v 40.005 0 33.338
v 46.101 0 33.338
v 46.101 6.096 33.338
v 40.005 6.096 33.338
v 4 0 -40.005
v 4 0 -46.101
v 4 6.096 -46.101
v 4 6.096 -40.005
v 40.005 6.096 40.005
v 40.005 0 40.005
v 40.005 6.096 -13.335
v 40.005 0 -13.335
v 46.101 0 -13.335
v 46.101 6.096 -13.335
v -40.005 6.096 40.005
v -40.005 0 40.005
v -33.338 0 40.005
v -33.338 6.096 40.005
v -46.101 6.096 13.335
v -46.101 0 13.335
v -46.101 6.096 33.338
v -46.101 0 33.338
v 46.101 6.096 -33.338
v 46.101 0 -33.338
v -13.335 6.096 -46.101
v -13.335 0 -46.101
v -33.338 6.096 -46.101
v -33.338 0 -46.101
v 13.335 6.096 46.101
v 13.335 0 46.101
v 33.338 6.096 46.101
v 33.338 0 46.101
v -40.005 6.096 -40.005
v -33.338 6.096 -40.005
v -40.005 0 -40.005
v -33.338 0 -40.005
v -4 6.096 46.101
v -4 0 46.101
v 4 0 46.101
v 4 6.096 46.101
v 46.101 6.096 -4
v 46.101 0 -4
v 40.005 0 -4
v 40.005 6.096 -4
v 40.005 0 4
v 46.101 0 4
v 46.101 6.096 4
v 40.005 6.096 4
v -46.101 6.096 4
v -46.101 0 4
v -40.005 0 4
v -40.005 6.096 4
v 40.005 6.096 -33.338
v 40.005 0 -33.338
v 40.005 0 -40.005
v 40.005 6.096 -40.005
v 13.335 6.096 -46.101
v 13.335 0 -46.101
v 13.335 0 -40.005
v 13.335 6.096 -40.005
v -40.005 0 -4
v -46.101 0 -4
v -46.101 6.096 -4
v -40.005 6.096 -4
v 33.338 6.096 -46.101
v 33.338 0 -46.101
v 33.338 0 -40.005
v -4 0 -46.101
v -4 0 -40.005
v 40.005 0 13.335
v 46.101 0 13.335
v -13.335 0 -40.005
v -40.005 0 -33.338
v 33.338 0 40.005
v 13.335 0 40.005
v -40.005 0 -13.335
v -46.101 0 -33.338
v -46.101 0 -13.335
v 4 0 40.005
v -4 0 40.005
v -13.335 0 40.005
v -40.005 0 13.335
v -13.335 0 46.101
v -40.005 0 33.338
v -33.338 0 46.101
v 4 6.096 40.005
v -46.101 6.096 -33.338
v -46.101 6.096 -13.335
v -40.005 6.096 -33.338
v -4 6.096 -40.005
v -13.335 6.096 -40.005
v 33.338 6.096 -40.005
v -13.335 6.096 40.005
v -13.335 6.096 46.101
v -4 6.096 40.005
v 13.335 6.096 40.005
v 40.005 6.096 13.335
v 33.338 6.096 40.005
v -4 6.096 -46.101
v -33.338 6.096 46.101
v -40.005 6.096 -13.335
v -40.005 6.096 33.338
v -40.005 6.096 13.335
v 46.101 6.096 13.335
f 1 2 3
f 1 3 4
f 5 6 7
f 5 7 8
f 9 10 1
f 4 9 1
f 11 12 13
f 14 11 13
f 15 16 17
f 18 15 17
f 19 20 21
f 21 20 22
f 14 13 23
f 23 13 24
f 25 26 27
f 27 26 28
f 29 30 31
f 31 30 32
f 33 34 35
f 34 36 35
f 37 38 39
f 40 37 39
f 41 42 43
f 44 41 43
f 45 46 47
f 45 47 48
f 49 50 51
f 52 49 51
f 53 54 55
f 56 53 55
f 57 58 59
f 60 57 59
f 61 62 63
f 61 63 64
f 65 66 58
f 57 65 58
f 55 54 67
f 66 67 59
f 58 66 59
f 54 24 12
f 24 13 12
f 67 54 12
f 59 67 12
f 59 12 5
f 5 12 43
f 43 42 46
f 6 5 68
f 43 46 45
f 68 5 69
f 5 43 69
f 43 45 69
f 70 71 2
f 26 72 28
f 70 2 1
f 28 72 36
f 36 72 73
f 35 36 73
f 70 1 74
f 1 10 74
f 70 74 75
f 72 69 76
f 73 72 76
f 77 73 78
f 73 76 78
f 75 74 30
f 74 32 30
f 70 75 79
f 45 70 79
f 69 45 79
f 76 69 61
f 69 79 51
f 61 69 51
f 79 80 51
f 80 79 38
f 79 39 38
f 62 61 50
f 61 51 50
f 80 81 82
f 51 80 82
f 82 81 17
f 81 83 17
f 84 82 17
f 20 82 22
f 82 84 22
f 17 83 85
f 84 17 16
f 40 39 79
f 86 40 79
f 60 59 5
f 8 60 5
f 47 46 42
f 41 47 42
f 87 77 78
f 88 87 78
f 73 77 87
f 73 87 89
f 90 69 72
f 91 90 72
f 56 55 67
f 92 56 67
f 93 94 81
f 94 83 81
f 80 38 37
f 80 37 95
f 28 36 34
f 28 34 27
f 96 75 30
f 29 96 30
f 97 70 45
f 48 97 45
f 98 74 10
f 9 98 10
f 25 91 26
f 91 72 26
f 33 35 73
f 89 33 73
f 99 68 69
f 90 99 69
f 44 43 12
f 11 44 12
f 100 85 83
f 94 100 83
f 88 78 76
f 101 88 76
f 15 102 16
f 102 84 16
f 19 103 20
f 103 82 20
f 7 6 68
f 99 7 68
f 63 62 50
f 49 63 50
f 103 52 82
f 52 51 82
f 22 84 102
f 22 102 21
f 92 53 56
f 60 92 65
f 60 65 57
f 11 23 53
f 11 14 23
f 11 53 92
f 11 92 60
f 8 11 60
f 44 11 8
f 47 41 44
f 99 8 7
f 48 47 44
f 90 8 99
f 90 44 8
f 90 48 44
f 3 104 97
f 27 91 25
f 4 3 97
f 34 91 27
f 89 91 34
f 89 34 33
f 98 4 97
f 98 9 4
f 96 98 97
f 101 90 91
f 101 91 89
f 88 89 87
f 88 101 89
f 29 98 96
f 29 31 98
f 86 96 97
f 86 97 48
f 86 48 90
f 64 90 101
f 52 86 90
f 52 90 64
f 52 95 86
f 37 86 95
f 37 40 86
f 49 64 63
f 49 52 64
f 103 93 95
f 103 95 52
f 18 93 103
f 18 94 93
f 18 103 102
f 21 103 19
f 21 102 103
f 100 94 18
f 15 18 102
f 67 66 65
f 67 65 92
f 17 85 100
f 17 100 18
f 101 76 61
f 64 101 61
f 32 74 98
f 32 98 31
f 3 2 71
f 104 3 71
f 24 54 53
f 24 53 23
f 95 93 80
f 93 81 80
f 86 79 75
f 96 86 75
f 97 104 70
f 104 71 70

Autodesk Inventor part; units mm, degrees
ref_plane "YZ Plane" through (0, 0, 0) normal (1, 0, 0) x (0, 1, 0)
ref_plane "XZ Plane" through (0, 0, 0) normal (0, 1, 0) x (-1, 0, 0)
ref_plane "XY Plane" through (0, 0, 0) normal (0, 0, 1) x (1, 0, 0)
sketch "Sketch1" plane through (0, 0, 0) normal (0, 1, 0) x (-1, 0, 0)
  line L0 (40.005, 40.005) -> (-40.005, 40.005)
  line L1 (-40.005, 40.005) -> (-40.005, -40.005)
  line L2 (-40.005, -40.005) -> (-33.3375, -40.005)
  line L3 (40.005, -40.005) -> (40.005, 40.005)
  line L4 (40.005, 40.005) -> (-40.005, -40.005) construction
  line L5 (-40.005, 40.005) -> (40.005, -40.005) construction
  line L6 (46.101, 46.101) -> (-46.101, 46.101)
  line L7 (-46.101, 46.101) -> (-46.101, -46.101)
  line L8 (-46.101, -46.101) -> (-33.3375, -46.101)
  line L9 (46.101, -46.101) -> (46.101, 46.101)
  line L10 (46.101, 46.101) -> (-46.101, -46.101) construction
  line L11 (-46.101, 46.101) -> (46.101, -46.101) construction
  line L12 (33.3375, -40.005) -> (33.3375, -46.101)
  line L13 (13.335, -40.005) -> (13.335, -46.101)
  line L14 (13.335, -40.005) -> (33.3375, -40.005)
  line L15 (33.3375, -46.101) -> (46.101, -46.101)
  line L16 (13.335, -46.101) -> (33.3375, -46.101)
  line L17 (33.3375, -40.005) -> (40.005, -40.005)
  line L18 (-20.9635, 41.5612) -> (22.9239, 41.5612) construction
  line L19 (22.9239, 41.5612) -> (22.9239, 28.3672) construction
  line L20 (22.9239, 28.3672) -> (-20.9635, 28.3672) construction
  line L21 (-20.9635, 28.3672) -> (-20.9635, 41.5612) construction
  line L22 (4.0005, -46.101) -> (4.0005, -40.005)
  line L23 (-4.0005, -46.101) -> (-4.0005, -40.005)
  line L24 (-13.335, -46.101) -> (-13.335, -40.005)
  line L25 (-33.3375, -46.101) -> (-33.3375, -40.005)
  line L26 (4.0005, -40.005) -> (13.335, -40.005)
  line L27 (-4.0005, -40.005) -> (4.0005, -40.005)
  line L28 (-4.0005, -46.101) -> (4.0005, -46.101)
  line L29 (4.0005, -46.101) -> (13.335, -46.101)
  line L30 (-13.335, -46.101) -> (-4.0005, -46.101)
  line L31 (-33.3375, -46.101) -> (-13.335, -46.101)
  line L32 (-33.3375, -40.005) -> (-13.335, -40.005)
  line L33 (-13.335, -40.005) -> (-4.0005, -40.005)
  point P0 (0, 0)
  dimension "baseLength" = 80.01
  dimension "d1" = 80.01
  dimension "d2" = 6.096
  dimension "toothLength" = 20.0025
  dimension "toothOffset" = 13.335
  dimension "d16" = 8.001
  dimension "d17" = 4.0005
  dimension "d18" = 20.0025
  dimension "d19" = 13.335
extrude "Extrusion1" add sketch "Sketch1" along normal blind 6.096 contours L3 L17 L14 L26 L27 L33 L32 L2 L1 L0
extrude "Extrusion2" add sketch "Sketch1" along normal blind 6.096 contours L12 L16 L13 L14 | L32 L24 L31 L25 | L22 L28 L23 L27
pattern_circular "Circular Pattern1" count 4 over 360 about axis through (0, -10, 0) along (0, 1, 0) of "Extrusion2"
equation "\"baseLength\" = glassLength"
equation "\"d1\" = baseLength"
equation "\"d2\" = woodThickness"
equation "\"toothLength\" = 0.25 * baseLength"
equation "\"toothOffset\" = 0.666667 * toothLength"
equation "\"d16\" = 0.4 * toothLength"
equation "\"d17\" = 0.5 * d16"
equation "\"d18\" = toothLength"
equation "\"d19\" = toothOffset"
equation "\"d6\" = woodThickness"
equation "\"d8\" = woodThickness"
equation "\"woodThickness\" = 6.096"
equation "\"glassLength\" = 80.01"
equation "\"glassHeight\" = 80.772"
equation "\"lip\" = 9.525"
equation "\"lasorTol\" = 0.0635"
properties part number "CandleHolder-1"
